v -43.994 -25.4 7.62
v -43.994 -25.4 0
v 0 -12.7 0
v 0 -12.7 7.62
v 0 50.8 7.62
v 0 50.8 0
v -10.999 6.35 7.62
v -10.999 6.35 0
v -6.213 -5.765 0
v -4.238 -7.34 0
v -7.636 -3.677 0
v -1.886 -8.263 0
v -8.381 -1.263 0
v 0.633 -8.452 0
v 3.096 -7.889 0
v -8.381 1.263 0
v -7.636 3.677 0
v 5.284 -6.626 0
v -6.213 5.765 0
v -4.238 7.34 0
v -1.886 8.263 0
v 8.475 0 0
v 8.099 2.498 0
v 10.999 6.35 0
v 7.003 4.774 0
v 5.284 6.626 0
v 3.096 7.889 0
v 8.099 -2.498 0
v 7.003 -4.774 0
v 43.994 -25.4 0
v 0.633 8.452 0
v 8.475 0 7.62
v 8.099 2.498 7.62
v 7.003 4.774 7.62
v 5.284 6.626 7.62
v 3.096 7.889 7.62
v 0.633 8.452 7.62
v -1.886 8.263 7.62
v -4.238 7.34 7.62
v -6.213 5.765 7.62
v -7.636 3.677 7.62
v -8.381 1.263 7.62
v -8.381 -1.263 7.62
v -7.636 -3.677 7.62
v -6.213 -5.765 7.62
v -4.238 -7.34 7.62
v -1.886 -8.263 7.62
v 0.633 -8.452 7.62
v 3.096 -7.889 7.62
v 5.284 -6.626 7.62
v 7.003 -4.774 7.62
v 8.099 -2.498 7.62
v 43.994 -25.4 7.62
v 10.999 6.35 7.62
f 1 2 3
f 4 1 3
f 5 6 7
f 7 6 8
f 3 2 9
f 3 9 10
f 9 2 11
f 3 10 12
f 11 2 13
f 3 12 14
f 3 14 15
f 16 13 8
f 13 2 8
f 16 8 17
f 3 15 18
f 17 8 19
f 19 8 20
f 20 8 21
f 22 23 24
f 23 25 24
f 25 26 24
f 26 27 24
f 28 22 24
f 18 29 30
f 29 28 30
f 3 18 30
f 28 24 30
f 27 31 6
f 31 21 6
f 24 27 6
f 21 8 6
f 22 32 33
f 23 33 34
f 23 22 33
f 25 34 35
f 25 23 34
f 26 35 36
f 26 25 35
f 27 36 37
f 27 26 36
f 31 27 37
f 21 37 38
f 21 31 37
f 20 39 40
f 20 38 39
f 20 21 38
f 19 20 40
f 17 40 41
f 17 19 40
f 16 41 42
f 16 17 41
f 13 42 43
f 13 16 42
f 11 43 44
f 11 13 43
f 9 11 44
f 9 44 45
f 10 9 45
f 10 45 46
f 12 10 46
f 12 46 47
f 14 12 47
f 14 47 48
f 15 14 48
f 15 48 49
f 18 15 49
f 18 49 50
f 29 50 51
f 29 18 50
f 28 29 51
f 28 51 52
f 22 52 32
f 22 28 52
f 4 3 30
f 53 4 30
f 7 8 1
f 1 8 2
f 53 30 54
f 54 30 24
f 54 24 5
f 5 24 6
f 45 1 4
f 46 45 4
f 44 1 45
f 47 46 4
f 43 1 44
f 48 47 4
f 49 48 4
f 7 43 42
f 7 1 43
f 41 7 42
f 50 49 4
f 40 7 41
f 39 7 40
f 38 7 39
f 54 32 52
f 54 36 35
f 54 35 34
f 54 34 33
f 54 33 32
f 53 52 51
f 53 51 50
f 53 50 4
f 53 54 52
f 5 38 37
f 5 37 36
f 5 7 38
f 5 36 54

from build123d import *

# Parameters (mm, degrees)
F2_DEPTH = 7.62
F1_R     = 8.475319
F3_DEPTH = 73.914


with BuildPart() as f2:
    # F0 (on Top) → F2 (new body)
    with BuildSketch(Plane.XY):
        Polygon((-10.998523, 6.35), (0, 0), (0, 50.8), align=None)
        Polygon((-10.998523, 6.35), (-43.994091, -25.4), (0, 0), align=None)
        Polygon((0, 0), (-43.994091, -25.4), (0, -12.7), align=None)
        Polygon((43.994091, -25.4), (0, 0), (0, -12.7), align=None)
        Polygon((0, 50.8), (0, 0), (10.998523, 6.35), align=None)
        Polygon((10.998523, 6.35), (0, 0), (43.994091, -25.4), align=None)
    extrude(amount=F2_DEPTH)

    # F1 (on Top) → F3 (cut)
    with BuildSketch(Plane.XY):
        Circle(F1_R)
    extrude(amount=F3_DEPTH, mode=Mode.SUBTRACT)


solid = f2.part
